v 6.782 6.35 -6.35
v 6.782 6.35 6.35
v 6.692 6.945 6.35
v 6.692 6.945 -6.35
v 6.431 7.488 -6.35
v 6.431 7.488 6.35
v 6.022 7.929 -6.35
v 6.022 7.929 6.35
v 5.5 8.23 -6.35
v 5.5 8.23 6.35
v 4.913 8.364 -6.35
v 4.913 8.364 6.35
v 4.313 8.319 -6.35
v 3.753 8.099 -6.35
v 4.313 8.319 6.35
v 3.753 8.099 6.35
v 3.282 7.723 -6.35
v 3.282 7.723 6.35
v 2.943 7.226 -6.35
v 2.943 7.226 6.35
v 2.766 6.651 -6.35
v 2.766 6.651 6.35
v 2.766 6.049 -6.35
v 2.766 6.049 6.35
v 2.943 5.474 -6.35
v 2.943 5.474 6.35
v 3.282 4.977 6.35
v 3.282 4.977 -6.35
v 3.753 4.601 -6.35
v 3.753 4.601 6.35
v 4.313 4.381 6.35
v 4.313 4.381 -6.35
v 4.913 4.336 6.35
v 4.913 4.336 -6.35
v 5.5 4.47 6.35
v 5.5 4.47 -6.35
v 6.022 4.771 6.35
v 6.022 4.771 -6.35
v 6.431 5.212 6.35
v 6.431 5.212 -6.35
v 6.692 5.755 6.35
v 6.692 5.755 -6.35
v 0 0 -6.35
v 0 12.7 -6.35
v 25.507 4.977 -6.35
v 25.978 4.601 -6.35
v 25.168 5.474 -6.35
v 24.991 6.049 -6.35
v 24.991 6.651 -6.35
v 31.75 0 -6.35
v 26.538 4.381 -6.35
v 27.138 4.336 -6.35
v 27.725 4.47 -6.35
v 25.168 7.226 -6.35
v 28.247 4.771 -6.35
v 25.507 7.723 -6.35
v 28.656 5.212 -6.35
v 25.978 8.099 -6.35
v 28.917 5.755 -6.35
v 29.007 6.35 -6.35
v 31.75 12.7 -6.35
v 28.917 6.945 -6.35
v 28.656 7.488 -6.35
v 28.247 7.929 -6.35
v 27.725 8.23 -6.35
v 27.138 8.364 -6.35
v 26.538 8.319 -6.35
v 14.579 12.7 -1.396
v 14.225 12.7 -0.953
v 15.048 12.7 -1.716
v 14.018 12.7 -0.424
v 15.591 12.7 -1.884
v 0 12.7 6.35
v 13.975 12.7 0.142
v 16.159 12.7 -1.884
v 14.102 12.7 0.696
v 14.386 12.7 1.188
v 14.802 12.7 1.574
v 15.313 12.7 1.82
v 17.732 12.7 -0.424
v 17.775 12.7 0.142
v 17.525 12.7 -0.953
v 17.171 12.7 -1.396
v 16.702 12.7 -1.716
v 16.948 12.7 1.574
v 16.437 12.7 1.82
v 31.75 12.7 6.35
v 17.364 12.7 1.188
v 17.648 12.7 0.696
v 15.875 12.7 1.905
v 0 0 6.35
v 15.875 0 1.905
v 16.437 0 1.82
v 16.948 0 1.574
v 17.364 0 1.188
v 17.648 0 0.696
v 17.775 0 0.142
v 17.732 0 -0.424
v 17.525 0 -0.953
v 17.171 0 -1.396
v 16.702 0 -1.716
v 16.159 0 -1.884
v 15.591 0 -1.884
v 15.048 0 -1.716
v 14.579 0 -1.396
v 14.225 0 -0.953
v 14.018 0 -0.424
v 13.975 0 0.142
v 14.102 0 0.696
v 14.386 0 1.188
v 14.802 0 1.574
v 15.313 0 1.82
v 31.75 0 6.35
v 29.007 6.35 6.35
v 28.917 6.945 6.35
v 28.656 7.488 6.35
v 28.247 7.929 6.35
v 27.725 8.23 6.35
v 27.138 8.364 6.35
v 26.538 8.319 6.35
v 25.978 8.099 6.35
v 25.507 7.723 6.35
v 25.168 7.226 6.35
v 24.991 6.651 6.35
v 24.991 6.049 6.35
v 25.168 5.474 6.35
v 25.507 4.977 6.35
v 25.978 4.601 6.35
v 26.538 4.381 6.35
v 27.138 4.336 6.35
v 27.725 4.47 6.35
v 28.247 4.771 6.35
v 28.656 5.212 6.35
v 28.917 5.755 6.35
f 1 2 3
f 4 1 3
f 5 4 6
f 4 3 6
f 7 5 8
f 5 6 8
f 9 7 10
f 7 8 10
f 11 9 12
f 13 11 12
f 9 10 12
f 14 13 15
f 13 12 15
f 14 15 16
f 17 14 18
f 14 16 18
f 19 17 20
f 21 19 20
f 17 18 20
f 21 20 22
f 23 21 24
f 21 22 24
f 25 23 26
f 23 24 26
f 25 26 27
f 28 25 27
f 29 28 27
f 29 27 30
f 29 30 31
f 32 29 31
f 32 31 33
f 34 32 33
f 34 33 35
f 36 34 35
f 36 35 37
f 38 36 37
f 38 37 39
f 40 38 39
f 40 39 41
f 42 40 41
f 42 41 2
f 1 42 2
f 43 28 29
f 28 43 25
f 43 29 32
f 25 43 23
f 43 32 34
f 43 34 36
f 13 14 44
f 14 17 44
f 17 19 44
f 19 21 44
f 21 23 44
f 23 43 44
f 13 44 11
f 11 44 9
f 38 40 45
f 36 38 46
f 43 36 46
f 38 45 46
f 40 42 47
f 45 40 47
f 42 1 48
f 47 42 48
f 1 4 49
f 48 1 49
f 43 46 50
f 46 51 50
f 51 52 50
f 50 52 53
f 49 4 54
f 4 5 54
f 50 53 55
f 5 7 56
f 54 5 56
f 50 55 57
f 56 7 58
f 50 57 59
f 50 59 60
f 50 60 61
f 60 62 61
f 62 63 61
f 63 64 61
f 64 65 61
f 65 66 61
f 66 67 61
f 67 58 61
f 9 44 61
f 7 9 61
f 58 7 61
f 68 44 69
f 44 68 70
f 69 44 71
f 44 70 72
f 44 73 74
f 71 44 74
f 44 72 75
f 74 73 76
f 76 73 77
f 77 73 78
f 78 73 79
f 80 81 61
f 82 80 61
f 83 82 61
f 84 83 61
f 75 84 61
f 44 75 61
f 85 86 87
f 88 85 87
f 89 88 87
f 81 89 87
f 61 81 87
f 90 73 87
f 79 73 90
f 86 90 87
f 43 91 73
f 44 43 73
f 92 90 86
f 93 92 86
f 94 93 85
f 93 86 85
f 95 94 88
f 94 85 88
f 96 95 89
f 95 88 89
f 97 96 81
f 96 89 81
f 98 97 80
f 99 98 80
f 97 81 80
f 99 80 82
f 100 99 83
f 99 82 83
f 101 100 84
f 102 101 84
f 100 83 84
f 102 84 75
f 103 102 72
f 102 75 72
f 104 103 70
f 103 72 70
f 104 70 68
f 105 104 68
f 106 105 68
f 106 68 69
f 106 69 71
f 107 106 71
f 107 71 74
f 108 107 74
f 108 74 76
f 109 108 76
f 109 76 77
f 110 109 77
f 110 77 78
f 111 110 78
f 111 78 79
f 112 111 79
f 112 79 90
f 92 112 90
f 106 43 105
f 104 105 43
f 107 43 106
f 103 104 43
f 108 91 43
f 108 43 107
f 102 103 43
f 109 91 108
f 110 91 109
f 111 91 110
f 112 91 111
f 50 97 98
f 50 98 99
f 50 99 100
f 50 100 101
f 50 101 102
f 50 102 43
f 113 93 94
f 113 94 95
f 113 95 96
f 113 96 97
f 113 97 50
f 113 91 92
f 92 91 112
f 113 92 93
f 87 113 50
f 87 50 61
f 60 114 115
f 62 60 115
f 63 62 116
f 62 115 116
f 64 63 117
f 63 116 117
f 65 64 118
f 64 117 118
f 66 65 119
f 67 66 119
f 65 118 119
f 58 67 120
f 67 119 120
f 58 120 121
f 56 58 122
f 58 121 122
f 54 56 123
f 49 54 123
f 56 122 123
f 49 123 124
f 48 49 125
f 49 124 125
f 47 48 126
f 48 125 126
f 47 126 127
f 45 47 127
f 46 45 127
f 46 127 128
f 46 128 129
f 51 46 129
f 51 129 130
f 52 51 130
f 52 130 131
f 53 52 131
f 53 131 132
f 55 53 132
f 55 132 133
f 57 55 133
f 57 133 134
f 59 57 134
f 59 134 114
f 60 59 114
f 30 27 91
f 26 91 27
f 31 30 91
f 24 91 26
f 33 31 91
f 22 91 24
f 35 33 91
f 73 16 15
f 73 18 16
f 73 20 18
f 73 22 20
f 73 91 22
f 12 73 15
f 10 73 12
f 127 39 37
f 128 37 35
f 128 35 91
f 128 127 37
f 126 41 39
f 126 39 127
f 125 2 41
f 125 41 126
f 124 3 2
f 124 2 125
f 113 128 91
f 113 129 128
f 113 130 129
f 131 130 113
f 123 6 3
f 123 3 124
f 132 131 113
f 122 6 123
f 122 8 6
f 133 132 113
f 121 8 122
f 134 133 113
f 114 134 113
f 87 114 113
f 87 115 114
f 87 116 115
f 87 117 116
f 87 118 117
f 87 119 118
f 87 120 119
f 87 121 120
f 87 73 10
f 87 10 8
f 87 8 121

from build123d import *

# Parameters (mm, degrees)
SKETCH1_W           = 31.75
SKETCH1_H           = 12.7
BOSS_EXTRUDE1_DEPTH = 6.35
SKETCH2_R           = 2.0193
CUT_EXTRUDE1_DEPTH  = 37.477972806
SKETCH3_R           = 1.905
CUT_EXTRUDE2_DEPTH  = 35.780382402


with BuildPart() as part:
    # Sketch1 → Boss-Extrude1 (new, symmetric)
    with BuildSketch(Plane.XY):
        with Locations((15.875, 6.35)):
            Rectangle(SKETCH1_W, SKETCH1_H)
    extrude(amount=BOSS_EXTRUDE1_DEPTH, both=True)

    # Sketch2 → Cut-Extrude1 (cut, through all)
    with BuildSketch(Plane.XY.offset(6.35)):
        with Locations((4.7625, 6.35)):
            Circle(SKETCH2_R)
        with Locations((26.9875, 6.35)):
            Circle(SKETCH2_R)
    extrude(amount=-CUT_EXTRUDE1_DEPTH, mode=Mode.SUBTRACT)

    # Sketch3 → Cut-Extrude2 (cut, through all)
    with BuildSketch(Plane(origin=(0, 12.7, 0), x_dir=(1, 0, 0), z_dir=(0, 1, 0))):
        with Locations(Location((15.875, 0, 0), (0, 0, 270))):
            Circle(SKETCH3_R)
    extrude(amount=-CUT_EXTRUDE2_DEPTH, mode=Mode.SUBTRACT)


solid = part.part
